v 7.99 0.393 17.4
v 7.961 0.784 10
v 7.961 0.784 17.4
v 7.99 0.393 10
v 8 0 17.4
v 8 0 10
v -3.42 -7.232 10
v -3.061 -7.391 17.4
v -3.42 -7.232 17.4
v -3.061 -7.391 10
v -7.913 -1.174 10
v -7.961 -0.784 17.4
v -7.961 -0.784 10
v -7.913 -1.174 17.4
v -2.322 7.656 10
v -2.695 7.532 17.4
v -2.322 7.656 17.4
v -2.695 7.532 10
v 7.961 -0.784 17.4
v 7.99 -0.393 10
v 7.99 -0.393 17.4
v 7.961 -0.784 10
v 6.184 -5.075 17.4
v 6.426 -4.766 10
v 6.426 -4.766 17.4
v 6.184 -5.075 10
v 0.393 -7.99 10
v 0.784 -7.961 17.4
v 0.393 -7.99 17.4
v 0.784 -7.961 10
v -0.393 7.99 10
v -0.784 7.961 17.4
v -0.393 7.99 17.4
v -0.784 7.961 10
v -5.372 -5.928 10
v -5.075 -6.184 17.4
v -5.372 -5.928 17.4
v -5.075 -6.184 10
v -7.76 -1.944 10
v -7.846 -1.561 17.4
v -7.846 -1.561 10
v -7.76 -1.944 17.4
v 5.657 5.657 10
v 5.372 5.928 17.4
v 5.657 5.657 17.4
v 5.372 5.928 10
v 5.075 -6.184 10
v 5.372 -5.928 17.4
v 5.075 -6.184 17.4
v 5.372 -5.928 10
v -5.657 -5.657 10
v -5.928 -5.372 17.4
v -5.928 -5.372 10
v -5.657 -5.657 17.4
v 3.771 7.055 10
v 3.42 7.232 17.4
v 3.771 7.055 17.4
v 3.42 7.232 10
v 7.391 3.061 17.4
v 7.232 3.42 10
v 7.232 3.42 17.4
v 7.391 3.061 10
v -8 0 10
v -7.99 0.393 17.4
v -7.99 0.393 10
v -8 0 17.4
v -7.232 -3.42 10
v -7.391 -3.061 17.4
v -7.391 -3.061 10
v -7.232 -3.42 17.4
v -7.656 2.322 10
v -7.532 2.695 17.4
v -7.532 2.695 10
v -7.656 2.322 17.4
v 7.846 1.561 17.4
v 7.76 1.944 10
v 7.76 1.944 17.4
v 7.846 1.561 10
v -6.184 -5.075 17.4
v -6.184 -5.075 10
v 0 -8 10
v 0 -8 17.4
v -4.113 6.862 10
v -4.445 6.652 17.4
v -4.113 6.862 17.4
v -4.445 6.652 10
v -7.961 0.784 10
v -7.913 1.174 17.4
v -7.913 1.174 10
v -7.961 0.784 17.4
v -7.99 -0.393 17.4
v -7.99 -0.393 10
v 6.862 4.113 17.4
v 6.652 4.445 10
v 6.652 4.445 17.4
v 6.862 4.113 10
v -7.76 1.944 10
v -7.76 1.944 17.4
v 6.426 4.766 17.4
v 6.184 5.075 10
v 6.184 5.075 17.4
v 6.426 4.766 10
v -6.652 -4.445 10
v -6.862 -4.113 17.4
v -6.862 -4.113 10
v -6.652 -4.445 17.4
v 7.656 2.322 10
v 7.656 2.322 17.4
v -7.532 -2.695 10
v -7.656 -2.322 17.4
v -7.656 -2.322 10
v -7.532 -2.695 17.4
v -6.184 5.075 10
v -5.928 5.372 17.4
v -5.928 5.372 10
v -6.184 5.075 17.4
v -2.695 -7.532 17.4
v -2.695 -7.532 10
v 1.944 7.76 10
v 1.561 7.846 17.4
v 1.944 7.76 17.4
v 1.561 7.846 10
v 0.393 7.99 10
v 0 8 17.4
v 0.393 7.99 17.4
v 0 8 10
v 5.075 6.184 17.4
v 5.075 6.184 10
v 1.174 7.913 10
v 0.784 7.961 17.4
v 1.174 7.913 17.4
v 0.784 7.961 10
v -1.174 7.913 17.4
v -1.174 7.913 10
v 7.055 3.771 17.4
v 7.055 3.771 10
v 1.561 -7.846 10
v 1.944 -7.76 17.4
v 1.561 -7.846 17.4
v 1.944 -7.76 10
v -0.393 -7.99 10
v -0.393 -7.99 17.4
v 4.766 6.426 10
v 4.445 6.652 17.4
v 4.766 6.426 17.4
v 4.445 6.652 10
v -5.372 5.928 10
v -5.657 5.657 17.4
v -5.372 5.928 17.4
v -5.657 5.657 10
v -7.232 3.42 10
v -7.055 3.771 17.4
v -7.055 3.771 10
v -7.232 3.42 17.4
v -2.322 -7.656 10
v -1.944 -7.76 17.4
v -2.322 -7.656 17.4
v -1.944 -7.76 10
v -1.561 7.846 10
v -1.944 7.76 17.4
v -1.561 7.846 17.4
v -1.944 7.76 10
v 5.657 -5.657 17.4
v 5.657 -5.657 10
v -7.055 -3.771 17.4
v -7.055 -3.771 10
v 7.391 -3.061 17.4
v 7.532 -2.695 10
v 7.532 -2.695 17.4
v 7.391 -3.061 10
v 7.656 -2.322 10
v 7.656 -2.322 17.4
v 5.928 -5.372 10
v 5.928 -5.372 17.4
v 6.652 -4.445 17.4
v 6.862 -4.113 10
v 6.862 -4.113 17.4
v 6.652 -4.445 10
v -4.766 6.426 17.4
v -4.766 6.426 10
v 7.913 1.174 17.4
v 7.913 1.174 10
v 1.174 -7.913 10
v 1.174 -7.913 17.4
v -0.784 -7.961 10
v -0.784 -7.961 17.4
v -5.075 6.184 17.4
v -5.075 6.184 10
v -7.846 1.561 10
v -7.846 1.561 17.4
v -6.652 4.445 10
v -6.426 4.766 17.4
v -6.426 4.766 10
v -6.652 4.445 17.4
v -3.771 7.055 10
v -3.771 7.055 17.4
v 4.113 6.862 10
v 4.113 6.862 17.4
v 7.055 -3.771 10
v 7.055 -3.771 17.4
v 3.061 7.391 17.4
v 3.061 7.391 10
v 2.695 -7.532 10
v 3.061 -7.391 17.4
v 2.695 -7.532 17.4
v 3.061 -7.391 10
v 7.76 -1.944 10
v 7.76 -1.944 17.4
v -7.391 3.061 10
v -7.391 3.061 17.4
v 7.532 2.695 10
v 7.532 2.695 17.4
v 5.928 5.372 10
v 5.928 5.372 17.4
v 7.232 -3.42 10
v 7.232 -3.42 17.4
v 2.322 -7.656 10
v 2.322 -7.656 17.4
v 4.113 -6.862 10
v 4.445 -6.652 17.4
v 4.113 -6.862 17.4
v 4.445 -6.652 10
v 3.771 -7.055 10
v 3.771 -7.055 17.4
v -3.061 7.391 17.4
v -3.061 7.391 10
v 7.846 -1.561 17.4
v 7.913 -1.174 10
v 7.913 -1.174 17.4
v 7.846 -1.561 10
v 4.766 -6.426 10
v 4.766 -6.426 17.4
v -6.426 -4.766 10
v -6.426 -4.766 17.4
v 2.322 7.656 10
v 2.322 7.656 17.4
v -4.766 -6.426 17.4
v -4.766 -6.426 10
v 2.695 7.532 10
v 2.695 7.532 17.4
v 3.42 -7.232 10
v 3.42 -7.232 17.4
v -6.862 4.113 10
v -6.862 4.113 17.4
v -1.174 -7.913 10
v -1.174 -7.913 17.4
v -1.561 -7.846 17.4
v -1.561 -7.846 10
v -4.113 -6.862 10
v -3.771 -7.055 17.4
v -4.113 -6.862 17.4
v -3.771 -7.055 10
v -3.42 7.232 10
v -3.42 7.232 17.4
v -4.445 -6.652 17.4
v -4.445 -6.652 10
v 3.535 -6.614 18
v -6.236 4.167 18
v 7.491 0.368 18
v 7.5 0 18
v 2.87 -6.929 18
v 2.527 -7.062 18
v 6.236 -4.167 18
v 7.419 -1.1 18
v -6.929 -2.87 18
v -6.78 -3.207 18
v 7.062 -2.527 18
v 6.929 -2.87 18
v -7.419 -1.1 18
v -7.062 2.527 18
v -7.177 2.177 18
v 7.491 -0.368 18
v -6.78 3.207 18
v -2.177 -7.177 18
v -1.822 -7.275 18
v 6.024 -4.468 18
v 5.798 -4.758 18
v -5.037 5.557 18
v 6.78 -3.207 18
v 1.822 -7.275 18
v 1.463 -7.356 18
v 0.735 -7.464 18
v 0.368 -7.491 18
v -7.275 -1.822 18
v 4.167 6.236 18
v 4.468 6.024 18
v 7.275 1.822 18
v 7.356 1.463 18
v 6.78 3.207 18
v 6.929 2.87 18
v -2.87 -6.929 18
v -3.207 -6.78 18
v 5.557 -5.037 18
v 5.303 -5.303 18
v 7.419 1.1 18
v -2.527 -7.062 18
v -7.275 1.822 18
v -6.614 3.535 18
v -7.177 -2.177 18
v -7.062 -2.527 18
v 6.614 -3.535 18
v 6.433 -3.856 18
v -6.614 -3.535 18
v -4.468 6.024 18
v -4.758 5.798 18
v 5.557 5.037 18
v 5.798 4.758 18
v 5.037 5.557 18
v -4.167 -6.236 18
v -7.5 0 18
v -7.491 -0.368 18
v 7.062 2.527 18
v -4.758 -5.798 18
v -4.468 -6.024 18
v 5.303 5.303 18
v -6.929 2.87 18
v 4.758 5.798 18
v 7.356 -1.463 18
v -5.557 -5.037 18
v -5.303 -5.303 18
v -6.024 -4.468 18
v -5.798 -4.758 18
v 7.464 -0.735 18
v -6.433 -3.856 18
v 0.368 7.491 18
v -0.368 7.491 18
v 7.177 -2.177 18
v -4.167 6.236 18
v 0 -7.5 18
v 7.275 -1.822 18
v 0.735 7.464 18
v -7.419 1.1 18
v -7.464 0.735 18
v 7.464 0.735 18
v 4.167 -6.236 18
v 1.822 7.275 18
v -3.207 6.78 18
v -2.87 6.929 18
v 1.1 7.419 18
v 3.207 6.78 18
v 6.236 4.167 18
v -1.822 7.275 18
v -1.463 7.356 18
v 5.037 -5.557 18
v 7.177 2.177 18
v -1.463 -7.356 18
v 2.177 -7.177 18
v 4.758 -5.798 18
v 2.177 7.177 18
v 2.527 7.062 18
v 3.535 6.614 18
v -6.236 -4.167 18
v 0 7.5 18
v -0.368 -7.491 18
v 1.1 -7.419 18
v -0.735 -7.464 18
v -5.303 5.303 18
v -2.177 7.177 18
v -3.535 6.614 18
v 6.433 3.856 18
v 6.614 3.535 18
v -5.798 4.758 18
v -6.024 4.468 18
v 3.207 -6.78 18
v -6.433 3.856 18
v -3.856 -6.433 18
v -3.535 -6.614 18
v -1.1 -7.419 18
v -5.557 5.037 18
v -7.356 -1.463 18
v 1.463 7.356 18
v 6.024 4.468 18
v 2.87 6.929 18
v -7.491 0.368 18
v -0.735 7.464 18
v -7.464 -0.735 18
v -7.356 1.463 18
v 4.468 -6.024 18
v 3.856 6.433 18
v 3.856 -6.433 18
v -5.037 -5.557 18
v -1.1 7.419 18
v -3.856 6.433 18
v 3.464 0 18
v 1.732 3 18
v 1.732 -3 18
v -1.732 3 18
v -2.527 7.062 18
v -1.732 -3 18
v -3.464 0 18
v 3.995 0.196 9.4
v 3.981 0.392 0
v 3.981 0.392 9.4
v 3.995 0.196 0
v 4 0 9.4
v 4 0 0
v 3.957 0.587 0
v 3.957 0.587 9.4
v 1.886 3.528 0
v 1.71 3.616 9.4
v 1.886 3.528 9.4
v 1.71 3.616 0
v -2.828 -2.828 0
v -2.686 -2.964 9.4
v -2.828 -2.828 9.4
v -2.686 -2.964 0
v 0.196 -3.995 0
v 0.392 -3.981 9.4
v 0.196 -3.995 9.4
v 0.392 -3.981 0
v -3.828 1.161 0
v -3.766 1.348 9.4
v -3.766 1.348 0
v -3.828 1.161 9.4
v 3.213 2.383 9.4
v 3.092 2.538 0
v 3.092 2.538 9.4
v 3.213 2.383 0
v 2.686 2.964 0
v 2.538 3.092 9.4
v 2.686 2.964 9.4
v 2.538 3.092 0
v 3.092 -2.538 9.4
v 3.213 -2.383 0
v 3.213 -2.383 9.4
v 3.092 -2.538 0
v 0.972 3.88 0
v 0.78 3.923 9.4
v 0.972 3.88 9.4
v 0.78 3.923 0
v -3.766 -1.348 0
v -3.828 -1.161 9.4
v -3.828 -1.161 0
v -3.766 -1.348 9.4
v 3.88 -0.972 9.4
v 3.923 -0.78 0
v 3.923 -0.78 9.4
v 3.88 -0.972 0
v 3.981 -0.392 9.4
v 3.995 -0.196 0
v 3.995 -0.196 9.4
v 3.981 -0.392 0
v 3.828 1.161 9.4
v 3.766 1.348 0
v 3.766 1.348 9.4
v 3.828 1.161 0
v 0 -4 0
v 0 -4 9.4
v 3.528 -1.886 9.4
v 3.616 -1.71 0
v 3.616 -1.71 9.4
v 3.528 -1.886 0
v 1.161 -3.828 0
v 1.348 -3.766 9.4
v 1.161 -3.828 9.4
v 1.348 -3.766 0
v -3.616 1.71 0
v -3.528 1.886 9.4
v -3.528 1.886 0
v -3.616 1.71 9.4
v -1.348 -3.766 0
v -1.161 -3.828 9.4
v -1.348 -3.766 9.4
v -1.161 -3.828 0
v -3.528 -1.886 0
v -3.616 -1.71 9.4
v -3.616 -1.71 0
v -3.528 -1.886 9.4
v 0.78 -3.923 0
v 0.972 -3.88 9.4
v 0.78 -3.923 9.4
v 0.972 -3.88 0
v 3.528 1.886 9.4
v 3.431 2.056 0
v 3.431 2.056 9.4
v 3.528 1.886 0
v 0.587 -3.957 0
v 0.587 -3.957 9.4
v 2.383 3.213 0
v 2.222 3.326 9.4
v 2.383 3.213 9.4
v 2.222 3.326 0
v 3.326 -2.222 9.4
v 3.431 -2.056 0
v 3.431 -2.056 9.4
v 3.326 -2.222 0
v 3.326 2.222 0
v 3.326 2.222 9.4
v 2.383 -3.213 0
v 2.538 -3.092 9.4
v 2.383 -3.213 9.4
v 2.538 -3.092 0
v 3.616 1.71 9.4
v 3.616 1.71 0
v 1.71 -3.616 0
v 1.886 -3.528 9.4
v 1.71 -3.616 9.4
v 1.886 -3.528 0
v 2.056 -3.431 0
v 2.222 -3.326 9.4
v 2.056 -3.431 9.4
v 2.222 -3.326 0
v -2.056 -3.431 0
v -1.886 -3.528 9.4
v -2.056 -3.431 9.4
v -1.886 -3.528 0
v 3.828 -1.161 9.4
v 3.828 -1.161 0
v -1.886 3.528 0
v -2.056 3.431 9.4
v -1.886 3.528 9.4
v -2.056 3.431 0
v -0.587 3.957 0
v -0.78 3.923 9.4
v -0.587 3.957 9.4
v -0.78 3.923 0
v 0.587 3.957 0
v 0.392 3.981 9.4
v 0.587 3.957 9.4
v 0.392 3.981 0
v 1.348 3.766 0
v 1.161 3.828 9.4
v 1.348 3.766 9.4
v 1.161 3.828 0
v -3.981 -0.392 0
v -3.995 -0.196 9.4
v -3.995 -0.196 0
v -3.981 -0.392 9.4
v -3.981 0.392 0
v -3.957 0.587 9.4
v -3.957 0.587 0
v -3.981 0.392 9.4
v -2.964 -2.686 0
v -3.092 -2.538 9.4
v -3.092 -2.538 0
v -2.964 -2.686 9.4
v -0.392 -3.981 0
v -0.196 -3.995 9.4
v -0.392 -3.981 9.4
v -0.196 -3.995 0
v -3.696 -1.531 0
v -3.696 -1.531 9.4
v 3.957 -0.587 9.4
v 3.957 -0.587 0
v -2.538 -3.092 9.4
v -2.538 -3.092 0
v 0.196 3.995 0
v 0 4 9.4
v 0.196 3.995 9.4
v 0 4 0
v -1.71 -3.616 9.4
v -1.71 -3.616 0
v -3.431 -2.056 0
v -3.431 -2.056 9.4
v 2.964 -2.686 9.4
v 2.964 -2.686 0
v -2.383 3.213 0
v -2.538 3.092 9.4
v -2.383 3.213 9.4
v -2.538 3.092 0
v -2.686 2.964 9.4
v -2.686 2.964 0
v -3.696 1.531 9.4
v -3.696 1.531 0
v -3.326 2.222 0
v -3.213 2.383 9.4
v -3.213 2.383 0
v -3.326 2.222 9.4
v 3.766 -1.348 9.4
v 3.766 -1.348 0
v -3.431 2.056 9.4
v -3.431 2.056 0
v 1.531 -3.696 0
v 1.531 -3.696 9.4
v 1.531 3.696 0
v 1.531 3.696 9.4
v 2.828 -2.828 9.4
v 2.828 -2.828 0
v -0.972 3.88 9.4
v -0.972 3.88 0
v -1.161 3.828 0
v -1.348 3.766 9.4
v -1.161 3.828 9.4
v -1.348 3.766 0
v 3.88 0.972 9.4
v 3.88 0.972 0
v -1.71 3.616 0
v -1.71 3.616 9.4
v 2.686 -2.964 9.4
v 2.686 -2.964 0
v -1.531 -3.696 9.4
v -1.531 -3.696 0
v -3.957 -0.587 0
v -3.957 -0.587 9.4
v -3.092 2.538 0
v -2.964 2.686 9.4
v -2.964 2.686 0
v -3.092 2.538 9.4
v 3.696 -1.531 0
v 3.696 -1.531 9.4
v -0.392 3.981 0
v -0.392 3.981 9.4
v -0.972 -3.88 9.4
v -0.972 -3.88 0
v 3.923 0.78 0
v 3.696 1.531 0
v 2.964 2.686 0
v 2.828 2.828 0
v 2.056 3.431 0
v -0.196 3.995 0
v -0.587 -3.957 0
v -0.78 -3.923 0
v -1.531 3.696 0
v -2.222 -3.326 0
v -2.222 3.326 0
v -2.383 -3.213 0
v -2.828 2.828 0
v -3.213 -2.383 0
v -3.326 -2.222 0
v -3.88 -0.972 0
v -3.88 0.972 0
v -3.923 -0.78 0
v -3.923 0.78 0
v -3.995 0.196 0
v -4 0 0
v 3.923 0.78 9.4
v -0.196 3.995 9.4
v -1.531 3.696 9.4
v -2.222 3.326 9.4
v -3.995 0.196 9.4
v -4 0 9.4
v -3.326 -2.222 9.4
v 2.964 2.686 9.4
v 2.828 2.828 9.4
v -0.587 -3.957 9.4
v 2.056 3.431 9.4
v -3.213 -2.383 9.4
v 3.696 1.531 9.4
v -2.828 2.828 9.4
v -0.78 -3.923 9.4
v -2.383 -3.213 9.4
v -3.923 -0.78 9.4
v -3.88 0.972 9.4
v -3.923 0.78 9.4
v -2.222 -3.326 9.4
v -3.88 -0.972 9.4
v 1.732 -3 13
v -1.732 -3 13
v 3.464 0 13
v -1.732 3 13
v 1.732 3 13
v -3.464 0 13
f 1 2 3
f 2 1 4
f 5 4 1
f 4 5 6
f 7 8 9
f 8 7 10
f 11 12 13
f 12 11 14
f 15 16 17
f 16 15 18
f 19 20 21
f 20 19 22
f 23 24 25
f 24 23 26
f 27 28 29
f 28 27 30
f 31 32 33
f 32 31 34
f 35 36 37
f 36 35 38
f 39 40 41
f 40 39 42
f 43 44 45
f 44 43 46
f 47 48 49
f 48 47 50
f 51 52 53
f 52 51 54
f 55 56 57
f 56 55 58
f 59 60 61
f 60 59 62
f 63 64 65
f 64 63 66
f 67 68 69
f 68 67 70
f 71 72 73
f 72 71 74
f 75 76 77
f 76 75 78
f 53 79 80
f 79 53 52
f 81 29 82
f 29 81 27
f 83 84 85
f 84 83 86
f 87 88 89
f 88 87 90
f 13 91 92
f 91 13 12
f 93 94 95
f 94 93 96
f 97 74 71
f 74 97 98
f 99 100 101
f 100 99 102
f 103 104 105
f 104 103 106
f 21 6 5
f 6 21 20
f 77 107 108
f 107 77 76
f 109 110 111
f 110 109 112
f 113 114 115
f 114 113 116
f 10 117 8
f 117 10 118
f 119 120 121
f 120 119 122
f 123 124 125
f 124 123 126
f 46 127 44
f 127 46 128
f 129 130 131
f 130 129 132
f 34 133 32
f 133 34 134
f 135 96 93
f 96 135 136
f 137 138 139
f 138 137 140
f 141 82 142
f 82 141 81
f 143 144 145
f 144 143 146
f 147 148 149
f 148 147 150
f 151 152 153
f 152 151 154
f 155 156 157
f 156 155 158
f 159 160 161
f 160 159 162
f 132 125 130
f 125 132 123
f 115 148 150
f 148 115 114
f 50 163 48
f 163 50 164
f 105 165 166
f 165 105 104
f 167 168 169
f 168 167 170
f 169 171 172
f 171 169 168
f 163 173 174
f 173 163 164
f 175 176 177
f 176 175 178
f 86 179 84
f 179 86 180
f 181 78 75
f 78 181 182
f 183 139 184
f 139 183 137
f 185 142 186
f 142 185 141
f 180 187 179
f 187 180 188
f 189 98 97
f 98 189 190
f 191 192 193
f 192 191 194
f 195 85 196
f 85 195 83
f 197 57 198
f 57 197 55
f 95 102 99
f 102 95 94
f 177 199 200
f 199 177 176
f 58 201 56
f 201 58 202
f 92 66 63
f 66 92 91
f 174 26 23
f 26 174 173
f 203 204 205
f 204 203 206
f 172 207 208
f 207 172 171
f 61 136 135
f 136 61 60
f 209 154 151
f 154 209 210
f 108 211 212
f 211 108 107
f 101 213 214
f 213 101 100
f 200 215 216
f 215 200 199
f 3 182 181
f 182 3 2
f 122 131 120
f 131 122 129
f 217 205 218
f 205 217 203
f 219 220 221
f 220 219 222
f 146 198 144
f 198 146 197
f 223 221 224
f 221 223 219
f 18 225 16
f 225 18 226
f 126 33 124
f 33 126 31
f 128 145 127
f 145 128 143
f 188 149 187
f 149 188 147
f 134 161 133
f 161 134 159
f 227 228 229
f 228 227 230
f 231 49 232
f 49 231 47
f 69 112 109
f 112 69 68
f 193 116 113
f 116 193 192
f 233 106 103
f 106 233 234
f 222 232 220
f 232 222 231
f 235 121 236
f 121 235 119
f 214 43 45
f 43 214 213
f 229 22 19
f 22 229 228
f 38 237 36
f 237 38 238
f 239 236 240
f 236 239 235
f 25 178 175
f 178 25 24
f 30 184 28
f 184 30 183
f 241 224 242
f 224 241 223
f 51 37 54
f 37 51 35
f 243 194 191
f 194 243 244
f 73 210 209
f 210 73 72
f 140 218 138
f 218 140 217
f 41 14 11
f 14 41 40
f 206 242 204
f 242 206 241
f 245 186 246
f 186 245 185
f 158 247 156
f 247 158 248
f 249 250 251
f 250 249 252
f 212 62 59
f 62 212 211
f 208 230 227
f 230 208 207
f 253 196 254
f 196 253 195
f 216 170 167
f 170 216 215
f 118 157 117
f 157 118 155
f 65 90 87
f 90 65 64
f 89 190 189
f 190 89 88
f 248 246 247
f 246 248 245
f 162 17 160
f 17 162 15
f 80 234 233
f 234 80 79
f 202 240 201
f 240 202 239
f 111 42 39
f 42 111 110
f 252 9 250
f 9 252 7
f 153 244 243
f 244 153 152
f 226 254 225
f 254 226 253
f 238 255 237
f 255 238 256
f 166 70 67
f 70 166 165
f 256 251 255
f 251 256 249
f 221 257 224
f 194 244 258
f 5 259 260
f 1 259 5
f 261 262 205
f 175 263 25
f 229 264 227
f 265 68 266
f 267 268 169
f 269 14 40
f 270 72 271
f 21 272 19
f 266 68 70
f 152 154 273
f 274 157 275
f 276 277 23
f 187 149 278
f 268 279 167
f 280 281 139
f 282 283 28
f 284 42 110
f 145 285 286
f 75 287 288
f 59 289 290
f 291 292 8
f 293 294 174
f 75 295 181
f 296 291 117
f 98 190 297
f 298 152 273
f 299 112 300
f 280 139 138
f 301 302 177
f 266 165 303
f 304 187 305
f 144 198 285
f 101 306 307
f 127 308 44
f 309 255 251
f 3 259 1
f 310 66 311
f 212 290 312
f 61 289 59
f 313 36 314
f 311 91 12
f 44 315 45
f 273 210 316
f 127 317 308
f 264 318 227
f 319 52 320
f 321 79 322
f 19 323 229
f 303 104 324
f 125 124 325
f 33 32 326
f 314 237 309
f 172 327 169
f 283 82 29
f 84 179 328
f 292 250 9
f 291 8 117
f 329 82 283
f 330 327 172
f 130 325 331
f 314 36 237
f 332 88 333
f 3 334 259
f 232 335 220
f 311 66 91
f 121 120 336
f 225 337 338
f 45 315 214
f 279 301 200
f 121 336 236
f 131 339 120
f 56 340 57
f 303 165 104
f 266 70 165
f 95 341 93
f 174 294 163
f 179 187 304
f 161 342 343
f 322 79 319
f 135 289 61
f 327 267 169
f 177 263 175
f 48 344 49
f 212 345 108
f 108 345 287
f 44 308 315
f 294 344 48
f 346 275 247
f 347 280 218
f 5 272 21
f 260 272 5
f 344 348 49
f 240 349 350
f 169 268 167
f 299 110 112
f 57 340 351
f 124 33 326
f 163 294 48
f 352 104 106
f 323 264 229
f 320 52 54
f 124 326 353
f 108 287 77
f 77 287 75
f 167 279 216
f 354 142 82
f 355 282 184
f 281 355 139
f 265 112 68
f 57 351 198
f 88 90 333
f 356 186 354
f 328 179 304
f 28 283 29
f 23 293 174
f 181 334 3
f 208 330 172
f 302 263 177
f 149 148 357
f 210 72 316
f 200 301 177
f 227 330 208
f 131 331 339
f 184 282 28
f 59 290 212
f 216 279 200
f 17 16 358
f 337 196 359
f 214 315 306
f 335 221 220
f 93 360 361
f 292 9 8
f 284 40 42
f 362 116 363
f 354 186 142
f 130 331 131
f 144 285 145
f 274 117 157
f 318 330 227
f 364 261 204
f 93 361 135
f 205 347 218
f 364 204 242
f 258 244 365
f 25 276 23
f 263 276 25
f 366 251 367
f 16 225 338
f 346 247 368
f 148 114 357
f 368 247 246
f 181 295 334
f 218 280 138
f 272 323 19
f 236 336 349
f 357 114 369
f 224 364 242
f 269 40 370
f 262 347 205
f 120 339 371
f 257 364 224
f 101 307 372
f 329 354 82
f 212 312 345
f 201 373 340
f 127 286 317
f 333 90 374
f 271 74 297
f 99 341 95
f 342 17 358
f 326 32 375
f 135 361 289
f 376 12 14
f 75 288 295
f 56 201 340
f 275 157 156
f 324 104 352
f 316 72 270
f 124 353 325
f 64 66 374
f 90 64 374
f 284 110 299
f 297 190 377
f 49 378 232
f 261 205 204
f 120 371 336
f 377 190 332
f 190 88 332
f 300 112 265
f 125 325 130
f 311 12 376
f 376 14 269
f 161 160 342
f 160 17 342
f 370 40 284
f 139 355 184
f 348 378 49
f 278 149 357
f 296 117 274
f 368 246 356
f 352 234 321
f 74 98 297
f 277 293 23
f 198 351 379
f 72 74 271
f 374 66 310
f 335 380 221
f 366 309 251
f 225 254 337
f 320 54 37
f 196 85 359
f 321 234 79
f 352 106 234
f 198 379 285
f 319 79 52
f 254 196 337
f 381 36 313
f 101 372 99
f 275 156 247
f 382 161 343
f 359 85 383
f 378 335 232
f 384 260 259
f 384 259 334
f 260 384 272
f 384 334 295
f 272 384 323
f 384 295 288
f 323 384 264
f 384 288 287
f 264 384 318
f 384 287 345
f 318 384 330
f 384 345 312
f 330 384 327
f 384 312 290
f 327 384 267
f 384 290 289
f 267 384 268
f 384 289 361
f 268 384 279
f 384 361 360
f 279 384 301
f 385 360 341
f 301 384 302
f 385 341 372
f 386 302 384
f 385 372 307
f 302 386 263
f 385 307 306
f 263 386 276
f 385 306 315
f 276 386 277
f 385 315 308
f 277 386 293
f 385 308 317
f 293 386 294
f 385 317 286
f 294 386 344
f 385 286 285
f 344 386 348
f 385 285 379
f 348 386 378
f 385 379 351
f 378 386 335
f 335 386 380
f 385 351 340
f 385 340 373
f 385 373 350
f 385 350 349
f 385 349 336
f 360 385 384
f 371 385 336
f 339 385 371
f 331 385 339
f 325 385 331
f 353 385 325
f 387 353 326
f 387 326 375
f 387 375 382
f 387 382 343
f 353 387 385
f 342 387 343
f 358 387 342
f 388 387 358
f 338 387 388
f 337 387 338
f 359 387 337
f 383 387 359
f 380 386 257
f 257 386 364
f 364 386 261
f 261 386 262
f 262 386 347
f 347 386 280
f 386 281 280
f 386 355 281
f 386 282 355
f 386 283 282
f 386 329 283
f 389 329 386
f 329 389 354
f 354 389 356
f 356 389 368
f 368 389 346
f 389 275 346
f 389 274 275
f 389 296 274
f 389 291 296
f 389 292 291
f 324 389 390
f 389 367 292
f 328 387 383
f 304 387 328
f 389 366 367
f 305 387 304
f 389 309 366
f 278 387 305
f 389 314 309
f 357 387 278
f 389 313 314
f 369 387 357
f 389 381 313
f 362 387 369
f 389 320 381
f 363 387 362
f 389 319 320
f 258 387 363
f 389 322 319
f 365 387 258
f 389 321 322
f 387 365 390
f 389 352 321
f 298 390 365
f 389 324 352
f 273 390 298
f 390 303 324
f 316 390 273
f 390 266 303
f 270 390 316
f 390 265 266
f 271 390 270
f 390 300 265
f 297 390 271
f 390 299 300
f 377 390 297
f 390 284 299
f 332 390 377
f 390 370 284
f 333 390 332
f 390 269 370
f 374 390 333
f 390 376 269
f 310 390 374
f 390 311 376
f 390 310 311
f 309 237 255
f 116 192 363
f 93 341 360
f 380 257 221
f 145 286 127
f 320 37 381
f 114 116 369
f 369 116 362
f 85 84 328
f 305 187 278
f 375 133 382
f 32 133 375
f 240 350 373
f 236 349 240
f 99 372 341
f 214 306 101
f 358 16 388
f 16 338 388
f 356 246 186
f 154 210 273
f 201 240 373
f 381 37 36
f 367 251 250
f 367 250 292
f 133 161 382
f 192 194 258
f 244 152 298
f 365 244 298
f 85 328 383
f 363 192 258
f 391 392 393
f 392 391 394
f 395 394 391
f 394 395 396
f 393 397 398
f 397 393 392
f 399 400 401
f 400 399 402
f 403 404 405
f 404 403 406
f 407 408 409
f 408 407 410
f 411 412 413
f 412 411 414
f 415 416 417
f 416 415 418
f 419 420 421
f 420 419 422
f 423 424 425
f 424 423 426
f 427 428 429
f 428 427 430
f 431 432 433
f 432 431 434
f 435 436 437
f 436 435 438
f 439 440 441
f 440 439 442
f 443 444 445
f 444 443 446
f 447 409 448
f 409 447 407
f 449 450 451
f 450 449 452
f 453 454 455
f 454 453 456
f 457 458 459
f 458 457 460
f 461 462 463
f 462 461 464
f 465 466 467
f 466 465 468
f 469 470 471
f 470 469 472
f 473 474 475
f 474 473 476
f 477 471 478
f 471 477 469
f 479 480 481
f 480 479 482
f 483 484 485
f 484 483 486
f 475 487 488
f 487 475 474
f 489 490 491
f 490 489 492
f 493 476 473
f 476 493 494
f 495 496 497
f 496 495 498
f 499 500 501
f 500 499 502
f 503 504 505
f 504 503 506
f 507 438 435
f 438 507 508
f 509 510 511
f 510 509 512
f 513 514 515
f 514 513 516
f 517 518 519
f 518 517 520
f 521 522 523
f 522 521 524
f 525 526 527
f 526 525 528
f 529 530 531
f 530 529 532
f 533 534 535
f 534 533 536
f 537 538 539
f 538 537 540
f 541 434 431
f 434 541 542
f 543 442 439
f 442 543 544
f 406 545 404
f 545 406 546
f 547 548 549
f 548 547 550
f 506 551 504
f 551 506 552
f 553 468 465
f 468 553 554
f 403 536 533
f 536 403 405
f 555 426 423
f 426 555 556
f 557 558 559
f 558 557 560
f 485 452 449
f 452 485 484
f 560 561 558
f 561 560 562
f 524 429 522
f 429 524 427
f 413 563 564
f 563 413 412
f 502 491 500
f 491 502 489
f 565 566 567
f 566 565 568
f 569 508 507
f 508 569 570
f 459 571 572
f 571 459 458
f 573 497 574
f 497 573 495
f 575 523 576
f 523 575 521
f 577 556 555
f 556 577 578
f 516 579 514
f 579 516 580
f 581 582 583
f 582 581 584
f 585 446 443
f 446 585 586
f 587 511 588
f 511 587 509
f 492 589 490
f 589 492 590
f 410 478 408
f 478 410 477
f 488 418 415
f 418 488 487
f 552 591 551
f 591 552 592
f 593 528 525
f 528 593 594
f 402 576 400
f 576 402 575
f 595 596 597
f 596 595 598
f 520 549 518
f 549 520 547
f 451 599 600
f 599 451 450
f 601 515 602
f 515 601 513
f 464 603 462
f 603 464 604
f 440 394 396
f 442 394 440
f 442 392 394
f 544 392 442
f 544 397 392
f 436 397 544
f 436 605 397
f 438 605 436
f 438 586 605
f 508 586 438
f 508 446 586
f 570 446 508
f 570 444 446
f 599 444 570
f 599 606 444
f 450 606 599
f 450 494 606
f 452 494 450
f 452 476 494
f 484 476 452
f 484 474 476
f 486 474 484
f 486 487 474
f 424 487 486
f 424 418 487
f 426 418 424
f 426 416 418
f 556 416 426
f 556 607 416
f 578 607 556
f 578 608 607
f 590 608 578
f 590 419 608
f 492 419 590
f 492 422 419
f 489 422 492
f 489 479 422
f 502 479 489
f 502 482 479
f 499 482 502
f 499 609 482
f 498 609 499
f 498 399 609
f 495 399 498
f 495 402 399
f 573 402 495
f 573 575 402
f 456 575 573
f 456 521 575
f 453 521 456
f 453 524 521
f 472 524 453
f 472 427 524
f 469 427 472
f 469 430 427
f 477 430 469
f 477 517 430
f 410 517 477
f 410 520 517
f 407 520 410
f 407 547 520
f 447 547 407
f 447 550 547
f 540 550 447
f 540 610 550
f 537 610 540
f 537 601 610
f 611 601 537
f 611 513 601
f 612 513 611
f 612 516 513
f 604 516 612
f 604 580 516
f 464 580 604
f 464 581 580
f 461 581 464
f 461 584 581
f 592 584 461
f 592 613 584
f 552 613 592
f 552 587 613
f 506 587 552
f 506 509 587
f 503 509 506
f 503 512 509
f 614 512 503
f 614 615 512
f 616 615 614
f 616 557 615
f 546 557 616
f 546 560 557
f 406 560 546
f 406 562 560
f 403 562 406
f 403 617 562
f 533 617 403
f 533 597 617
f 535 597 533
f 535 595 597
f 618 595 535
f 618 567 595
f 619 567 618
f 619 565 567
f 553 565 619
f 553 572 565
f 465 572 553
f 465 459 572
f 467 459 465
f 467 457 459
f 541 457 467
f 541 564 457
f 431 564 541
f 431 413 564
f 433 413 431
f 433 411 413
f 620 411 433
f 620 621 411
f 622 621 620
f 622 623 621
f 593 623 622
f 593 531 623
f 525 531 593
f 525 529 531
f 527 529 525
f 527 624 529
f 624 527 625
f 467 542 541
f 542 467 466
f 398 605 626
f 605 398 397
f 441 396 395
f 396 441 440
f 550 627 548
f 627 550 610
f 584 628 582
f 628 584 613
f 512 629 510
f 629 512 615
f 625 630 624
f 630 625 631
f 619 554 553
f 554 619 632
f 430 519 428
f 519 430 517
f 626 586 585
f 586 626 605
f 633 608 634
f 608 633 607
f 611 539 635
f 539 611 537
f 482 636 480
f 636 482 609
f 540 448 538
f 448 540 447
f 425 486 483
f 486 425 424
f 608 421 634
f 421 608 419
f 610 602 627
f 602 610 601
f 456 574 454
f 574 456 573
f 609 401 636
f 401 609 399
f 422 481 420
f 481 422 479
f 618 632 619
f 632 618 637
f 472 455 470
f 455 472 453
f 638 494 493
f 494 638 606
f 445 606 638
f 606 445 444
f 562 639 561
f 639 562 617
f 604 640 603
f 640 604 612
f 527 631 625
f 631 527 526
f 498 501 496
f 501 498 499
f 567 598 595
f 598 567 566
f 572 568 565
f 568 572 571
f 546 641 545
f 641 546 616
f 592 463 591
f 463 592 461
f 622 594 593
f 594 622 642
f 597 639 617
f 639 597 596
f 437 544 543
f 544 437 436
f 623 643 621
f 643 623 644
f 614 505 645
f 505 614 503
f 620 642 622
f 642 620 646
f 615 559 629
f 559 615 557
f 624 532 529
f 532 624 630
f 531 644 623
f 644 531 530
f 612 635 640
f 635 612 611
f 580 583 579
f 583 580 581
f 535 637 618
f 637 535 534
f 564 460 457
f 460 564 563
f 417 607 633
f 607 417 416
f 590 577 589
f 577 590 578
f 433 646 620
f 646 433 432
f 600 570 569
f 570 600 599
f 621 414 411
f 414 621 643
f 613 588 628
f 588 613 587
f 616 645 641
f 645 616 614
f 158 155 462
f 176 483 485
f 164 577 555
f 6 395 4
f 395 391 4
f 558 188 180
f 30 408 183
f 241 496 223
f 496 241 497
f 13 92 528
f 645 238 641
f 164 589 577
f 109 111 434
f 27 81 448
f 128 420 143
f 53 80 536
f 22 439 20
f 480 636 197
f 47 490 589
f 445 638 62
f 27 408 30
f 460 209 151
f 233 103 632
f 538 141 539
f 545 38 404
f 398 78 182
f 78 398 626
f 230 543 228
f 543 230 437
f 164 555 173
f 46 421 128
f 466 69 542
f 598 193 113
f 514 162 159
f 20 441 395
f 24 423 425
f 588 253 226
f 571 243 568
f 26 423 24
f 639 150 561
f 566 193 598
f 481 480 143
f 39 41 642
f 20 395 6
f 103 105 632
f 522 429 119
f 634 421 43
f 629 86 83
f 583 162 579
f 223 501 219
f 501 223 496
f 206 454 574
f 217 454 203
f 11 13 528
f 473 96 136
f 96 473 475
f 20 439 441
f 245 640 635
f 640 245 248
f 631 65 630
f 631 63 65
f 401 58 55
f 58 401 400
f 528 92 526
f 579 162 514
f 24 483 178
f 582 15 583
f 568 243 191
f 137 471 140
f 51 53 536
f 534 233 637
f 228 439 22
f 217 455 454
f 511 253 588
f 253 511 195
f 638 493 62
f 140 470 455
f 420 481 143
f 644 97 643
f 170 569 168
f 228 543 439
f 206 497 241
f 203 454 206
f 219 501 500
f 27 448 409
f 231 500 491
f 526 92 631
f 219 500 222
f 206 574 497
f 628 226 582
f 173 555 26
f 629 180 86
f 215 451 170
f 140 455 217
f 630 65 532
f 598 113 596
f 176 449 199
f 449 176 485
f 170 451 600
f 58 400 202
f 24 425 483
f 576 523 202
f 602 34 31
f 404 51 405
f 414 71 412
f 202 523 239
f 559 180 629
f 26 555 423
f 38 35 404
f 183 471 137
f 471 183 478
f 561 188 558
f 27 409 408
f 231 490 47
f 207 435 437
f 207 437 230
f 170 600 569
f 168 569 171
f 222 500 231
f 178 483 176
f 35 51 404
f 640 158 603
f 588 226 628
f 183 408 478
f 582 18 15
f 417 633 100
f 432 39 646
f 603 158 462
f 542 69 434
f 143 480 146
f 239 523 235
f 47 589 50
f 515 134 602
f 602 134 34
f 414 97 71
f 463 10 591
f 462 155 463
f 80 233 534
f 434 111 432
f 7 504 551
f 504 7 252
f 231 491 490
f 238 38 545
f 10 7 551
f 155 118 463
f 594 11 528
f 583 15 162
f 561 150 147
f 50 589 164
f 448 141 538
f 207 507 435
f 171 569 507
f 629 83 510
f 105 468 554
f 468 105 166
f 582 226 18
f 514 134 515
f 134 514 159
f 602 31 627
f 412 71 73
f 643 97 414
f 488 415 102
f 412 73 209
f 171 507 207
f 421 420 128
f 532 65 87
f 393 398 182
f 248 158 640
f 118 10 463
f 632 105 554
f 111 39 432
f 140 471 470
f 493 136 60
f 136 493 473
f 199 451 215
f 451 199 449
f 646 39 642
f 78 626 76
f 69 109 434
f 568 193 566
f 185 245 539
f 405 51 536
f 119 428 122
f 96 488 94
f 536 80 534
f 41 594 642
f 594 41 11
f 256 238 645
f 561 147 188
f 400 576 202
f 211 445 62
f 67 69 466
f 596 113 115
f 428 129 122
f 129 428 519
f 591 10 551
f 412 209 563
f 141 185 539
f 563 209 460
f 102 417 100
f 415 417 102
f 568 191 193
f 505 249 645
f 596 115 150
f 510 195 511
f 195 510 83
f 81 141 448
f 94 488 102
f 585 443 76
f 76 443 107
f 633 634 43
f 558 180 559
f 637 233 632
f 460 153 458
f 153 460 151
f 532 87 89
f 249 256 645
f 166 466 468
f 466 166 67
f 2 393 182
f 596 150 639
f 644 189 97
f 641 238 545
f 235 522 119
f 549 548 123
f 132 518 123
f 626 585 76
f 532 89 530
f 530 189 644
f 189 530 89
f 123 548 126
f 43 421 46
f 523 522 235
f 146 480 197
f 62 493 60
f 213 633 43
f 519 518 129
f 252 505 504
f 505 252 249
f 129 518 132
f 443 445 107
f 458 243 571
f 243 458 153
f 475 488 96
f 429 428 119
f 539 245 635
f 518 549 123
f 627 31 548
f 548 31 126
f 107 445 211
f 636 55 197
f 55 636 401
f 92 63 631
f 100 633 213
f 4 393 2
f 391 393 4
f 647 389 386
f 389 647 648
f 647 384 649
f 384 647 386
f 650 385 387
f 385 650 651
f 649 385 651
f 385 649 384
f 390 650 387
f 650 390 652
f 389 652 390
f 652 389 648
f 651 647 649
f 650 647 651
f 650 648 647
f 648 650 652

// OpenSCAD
$fn = 128;

// Socket Head Cap Screw (approx. ISO 4762 style)
// Given: shank diameter = 8.0 mm, head diameter = 16.0 mm, length under head = 10 mm

d_shank = 8.0;
l_shank = 10.0;

d_head  = 16.0;
h_head  = 8.0;          // typical for M8 socket head cap screw

d_socket = 6.0;         // typical hex socket across flats ~6 mm for M8
socket_depth = 5.0;     // typical

// Small edge chamfers (approximated as short tapers)
chamfer_h = 0.6;
chamfer_delta = 1.0;

module socket_head_cap_screw() {
    difference() {
        union() {
            // Shank (unthreaded cylinder)
            translate([0,0,0])
                cylinder(h = l_shank, d = d_shank);

            // Head with slight top chamfer
            translate([0,0,l_shank])
                union() {
                    // Main head body
                    cylinder(h = h_head - chamfer_h, d = d_head);

                    // Top chamfer (taper)
                    translate([0,0,h_head - chamfer_h])
                        cylinder(h = chamfer_h, d1 = d_head, d2 = d_head - chamfer_delta);
                }

            // Under-head fillet/chamfer approximation (taper from shank to head)
            translate([0,0,l_shank - chamfer_h])
                cylinder(h = chamfer_h, d1 = d_shank, d2 = d_head);
        }

        // Hex socket cut
        translate([0,0,l_shank + h_head - socket_depth])
            cylinder(h = socket_depth + 0.2, d = (d_socket / cos(30)), $fn = 6);
    }
}

socket_head_cap_screw();
